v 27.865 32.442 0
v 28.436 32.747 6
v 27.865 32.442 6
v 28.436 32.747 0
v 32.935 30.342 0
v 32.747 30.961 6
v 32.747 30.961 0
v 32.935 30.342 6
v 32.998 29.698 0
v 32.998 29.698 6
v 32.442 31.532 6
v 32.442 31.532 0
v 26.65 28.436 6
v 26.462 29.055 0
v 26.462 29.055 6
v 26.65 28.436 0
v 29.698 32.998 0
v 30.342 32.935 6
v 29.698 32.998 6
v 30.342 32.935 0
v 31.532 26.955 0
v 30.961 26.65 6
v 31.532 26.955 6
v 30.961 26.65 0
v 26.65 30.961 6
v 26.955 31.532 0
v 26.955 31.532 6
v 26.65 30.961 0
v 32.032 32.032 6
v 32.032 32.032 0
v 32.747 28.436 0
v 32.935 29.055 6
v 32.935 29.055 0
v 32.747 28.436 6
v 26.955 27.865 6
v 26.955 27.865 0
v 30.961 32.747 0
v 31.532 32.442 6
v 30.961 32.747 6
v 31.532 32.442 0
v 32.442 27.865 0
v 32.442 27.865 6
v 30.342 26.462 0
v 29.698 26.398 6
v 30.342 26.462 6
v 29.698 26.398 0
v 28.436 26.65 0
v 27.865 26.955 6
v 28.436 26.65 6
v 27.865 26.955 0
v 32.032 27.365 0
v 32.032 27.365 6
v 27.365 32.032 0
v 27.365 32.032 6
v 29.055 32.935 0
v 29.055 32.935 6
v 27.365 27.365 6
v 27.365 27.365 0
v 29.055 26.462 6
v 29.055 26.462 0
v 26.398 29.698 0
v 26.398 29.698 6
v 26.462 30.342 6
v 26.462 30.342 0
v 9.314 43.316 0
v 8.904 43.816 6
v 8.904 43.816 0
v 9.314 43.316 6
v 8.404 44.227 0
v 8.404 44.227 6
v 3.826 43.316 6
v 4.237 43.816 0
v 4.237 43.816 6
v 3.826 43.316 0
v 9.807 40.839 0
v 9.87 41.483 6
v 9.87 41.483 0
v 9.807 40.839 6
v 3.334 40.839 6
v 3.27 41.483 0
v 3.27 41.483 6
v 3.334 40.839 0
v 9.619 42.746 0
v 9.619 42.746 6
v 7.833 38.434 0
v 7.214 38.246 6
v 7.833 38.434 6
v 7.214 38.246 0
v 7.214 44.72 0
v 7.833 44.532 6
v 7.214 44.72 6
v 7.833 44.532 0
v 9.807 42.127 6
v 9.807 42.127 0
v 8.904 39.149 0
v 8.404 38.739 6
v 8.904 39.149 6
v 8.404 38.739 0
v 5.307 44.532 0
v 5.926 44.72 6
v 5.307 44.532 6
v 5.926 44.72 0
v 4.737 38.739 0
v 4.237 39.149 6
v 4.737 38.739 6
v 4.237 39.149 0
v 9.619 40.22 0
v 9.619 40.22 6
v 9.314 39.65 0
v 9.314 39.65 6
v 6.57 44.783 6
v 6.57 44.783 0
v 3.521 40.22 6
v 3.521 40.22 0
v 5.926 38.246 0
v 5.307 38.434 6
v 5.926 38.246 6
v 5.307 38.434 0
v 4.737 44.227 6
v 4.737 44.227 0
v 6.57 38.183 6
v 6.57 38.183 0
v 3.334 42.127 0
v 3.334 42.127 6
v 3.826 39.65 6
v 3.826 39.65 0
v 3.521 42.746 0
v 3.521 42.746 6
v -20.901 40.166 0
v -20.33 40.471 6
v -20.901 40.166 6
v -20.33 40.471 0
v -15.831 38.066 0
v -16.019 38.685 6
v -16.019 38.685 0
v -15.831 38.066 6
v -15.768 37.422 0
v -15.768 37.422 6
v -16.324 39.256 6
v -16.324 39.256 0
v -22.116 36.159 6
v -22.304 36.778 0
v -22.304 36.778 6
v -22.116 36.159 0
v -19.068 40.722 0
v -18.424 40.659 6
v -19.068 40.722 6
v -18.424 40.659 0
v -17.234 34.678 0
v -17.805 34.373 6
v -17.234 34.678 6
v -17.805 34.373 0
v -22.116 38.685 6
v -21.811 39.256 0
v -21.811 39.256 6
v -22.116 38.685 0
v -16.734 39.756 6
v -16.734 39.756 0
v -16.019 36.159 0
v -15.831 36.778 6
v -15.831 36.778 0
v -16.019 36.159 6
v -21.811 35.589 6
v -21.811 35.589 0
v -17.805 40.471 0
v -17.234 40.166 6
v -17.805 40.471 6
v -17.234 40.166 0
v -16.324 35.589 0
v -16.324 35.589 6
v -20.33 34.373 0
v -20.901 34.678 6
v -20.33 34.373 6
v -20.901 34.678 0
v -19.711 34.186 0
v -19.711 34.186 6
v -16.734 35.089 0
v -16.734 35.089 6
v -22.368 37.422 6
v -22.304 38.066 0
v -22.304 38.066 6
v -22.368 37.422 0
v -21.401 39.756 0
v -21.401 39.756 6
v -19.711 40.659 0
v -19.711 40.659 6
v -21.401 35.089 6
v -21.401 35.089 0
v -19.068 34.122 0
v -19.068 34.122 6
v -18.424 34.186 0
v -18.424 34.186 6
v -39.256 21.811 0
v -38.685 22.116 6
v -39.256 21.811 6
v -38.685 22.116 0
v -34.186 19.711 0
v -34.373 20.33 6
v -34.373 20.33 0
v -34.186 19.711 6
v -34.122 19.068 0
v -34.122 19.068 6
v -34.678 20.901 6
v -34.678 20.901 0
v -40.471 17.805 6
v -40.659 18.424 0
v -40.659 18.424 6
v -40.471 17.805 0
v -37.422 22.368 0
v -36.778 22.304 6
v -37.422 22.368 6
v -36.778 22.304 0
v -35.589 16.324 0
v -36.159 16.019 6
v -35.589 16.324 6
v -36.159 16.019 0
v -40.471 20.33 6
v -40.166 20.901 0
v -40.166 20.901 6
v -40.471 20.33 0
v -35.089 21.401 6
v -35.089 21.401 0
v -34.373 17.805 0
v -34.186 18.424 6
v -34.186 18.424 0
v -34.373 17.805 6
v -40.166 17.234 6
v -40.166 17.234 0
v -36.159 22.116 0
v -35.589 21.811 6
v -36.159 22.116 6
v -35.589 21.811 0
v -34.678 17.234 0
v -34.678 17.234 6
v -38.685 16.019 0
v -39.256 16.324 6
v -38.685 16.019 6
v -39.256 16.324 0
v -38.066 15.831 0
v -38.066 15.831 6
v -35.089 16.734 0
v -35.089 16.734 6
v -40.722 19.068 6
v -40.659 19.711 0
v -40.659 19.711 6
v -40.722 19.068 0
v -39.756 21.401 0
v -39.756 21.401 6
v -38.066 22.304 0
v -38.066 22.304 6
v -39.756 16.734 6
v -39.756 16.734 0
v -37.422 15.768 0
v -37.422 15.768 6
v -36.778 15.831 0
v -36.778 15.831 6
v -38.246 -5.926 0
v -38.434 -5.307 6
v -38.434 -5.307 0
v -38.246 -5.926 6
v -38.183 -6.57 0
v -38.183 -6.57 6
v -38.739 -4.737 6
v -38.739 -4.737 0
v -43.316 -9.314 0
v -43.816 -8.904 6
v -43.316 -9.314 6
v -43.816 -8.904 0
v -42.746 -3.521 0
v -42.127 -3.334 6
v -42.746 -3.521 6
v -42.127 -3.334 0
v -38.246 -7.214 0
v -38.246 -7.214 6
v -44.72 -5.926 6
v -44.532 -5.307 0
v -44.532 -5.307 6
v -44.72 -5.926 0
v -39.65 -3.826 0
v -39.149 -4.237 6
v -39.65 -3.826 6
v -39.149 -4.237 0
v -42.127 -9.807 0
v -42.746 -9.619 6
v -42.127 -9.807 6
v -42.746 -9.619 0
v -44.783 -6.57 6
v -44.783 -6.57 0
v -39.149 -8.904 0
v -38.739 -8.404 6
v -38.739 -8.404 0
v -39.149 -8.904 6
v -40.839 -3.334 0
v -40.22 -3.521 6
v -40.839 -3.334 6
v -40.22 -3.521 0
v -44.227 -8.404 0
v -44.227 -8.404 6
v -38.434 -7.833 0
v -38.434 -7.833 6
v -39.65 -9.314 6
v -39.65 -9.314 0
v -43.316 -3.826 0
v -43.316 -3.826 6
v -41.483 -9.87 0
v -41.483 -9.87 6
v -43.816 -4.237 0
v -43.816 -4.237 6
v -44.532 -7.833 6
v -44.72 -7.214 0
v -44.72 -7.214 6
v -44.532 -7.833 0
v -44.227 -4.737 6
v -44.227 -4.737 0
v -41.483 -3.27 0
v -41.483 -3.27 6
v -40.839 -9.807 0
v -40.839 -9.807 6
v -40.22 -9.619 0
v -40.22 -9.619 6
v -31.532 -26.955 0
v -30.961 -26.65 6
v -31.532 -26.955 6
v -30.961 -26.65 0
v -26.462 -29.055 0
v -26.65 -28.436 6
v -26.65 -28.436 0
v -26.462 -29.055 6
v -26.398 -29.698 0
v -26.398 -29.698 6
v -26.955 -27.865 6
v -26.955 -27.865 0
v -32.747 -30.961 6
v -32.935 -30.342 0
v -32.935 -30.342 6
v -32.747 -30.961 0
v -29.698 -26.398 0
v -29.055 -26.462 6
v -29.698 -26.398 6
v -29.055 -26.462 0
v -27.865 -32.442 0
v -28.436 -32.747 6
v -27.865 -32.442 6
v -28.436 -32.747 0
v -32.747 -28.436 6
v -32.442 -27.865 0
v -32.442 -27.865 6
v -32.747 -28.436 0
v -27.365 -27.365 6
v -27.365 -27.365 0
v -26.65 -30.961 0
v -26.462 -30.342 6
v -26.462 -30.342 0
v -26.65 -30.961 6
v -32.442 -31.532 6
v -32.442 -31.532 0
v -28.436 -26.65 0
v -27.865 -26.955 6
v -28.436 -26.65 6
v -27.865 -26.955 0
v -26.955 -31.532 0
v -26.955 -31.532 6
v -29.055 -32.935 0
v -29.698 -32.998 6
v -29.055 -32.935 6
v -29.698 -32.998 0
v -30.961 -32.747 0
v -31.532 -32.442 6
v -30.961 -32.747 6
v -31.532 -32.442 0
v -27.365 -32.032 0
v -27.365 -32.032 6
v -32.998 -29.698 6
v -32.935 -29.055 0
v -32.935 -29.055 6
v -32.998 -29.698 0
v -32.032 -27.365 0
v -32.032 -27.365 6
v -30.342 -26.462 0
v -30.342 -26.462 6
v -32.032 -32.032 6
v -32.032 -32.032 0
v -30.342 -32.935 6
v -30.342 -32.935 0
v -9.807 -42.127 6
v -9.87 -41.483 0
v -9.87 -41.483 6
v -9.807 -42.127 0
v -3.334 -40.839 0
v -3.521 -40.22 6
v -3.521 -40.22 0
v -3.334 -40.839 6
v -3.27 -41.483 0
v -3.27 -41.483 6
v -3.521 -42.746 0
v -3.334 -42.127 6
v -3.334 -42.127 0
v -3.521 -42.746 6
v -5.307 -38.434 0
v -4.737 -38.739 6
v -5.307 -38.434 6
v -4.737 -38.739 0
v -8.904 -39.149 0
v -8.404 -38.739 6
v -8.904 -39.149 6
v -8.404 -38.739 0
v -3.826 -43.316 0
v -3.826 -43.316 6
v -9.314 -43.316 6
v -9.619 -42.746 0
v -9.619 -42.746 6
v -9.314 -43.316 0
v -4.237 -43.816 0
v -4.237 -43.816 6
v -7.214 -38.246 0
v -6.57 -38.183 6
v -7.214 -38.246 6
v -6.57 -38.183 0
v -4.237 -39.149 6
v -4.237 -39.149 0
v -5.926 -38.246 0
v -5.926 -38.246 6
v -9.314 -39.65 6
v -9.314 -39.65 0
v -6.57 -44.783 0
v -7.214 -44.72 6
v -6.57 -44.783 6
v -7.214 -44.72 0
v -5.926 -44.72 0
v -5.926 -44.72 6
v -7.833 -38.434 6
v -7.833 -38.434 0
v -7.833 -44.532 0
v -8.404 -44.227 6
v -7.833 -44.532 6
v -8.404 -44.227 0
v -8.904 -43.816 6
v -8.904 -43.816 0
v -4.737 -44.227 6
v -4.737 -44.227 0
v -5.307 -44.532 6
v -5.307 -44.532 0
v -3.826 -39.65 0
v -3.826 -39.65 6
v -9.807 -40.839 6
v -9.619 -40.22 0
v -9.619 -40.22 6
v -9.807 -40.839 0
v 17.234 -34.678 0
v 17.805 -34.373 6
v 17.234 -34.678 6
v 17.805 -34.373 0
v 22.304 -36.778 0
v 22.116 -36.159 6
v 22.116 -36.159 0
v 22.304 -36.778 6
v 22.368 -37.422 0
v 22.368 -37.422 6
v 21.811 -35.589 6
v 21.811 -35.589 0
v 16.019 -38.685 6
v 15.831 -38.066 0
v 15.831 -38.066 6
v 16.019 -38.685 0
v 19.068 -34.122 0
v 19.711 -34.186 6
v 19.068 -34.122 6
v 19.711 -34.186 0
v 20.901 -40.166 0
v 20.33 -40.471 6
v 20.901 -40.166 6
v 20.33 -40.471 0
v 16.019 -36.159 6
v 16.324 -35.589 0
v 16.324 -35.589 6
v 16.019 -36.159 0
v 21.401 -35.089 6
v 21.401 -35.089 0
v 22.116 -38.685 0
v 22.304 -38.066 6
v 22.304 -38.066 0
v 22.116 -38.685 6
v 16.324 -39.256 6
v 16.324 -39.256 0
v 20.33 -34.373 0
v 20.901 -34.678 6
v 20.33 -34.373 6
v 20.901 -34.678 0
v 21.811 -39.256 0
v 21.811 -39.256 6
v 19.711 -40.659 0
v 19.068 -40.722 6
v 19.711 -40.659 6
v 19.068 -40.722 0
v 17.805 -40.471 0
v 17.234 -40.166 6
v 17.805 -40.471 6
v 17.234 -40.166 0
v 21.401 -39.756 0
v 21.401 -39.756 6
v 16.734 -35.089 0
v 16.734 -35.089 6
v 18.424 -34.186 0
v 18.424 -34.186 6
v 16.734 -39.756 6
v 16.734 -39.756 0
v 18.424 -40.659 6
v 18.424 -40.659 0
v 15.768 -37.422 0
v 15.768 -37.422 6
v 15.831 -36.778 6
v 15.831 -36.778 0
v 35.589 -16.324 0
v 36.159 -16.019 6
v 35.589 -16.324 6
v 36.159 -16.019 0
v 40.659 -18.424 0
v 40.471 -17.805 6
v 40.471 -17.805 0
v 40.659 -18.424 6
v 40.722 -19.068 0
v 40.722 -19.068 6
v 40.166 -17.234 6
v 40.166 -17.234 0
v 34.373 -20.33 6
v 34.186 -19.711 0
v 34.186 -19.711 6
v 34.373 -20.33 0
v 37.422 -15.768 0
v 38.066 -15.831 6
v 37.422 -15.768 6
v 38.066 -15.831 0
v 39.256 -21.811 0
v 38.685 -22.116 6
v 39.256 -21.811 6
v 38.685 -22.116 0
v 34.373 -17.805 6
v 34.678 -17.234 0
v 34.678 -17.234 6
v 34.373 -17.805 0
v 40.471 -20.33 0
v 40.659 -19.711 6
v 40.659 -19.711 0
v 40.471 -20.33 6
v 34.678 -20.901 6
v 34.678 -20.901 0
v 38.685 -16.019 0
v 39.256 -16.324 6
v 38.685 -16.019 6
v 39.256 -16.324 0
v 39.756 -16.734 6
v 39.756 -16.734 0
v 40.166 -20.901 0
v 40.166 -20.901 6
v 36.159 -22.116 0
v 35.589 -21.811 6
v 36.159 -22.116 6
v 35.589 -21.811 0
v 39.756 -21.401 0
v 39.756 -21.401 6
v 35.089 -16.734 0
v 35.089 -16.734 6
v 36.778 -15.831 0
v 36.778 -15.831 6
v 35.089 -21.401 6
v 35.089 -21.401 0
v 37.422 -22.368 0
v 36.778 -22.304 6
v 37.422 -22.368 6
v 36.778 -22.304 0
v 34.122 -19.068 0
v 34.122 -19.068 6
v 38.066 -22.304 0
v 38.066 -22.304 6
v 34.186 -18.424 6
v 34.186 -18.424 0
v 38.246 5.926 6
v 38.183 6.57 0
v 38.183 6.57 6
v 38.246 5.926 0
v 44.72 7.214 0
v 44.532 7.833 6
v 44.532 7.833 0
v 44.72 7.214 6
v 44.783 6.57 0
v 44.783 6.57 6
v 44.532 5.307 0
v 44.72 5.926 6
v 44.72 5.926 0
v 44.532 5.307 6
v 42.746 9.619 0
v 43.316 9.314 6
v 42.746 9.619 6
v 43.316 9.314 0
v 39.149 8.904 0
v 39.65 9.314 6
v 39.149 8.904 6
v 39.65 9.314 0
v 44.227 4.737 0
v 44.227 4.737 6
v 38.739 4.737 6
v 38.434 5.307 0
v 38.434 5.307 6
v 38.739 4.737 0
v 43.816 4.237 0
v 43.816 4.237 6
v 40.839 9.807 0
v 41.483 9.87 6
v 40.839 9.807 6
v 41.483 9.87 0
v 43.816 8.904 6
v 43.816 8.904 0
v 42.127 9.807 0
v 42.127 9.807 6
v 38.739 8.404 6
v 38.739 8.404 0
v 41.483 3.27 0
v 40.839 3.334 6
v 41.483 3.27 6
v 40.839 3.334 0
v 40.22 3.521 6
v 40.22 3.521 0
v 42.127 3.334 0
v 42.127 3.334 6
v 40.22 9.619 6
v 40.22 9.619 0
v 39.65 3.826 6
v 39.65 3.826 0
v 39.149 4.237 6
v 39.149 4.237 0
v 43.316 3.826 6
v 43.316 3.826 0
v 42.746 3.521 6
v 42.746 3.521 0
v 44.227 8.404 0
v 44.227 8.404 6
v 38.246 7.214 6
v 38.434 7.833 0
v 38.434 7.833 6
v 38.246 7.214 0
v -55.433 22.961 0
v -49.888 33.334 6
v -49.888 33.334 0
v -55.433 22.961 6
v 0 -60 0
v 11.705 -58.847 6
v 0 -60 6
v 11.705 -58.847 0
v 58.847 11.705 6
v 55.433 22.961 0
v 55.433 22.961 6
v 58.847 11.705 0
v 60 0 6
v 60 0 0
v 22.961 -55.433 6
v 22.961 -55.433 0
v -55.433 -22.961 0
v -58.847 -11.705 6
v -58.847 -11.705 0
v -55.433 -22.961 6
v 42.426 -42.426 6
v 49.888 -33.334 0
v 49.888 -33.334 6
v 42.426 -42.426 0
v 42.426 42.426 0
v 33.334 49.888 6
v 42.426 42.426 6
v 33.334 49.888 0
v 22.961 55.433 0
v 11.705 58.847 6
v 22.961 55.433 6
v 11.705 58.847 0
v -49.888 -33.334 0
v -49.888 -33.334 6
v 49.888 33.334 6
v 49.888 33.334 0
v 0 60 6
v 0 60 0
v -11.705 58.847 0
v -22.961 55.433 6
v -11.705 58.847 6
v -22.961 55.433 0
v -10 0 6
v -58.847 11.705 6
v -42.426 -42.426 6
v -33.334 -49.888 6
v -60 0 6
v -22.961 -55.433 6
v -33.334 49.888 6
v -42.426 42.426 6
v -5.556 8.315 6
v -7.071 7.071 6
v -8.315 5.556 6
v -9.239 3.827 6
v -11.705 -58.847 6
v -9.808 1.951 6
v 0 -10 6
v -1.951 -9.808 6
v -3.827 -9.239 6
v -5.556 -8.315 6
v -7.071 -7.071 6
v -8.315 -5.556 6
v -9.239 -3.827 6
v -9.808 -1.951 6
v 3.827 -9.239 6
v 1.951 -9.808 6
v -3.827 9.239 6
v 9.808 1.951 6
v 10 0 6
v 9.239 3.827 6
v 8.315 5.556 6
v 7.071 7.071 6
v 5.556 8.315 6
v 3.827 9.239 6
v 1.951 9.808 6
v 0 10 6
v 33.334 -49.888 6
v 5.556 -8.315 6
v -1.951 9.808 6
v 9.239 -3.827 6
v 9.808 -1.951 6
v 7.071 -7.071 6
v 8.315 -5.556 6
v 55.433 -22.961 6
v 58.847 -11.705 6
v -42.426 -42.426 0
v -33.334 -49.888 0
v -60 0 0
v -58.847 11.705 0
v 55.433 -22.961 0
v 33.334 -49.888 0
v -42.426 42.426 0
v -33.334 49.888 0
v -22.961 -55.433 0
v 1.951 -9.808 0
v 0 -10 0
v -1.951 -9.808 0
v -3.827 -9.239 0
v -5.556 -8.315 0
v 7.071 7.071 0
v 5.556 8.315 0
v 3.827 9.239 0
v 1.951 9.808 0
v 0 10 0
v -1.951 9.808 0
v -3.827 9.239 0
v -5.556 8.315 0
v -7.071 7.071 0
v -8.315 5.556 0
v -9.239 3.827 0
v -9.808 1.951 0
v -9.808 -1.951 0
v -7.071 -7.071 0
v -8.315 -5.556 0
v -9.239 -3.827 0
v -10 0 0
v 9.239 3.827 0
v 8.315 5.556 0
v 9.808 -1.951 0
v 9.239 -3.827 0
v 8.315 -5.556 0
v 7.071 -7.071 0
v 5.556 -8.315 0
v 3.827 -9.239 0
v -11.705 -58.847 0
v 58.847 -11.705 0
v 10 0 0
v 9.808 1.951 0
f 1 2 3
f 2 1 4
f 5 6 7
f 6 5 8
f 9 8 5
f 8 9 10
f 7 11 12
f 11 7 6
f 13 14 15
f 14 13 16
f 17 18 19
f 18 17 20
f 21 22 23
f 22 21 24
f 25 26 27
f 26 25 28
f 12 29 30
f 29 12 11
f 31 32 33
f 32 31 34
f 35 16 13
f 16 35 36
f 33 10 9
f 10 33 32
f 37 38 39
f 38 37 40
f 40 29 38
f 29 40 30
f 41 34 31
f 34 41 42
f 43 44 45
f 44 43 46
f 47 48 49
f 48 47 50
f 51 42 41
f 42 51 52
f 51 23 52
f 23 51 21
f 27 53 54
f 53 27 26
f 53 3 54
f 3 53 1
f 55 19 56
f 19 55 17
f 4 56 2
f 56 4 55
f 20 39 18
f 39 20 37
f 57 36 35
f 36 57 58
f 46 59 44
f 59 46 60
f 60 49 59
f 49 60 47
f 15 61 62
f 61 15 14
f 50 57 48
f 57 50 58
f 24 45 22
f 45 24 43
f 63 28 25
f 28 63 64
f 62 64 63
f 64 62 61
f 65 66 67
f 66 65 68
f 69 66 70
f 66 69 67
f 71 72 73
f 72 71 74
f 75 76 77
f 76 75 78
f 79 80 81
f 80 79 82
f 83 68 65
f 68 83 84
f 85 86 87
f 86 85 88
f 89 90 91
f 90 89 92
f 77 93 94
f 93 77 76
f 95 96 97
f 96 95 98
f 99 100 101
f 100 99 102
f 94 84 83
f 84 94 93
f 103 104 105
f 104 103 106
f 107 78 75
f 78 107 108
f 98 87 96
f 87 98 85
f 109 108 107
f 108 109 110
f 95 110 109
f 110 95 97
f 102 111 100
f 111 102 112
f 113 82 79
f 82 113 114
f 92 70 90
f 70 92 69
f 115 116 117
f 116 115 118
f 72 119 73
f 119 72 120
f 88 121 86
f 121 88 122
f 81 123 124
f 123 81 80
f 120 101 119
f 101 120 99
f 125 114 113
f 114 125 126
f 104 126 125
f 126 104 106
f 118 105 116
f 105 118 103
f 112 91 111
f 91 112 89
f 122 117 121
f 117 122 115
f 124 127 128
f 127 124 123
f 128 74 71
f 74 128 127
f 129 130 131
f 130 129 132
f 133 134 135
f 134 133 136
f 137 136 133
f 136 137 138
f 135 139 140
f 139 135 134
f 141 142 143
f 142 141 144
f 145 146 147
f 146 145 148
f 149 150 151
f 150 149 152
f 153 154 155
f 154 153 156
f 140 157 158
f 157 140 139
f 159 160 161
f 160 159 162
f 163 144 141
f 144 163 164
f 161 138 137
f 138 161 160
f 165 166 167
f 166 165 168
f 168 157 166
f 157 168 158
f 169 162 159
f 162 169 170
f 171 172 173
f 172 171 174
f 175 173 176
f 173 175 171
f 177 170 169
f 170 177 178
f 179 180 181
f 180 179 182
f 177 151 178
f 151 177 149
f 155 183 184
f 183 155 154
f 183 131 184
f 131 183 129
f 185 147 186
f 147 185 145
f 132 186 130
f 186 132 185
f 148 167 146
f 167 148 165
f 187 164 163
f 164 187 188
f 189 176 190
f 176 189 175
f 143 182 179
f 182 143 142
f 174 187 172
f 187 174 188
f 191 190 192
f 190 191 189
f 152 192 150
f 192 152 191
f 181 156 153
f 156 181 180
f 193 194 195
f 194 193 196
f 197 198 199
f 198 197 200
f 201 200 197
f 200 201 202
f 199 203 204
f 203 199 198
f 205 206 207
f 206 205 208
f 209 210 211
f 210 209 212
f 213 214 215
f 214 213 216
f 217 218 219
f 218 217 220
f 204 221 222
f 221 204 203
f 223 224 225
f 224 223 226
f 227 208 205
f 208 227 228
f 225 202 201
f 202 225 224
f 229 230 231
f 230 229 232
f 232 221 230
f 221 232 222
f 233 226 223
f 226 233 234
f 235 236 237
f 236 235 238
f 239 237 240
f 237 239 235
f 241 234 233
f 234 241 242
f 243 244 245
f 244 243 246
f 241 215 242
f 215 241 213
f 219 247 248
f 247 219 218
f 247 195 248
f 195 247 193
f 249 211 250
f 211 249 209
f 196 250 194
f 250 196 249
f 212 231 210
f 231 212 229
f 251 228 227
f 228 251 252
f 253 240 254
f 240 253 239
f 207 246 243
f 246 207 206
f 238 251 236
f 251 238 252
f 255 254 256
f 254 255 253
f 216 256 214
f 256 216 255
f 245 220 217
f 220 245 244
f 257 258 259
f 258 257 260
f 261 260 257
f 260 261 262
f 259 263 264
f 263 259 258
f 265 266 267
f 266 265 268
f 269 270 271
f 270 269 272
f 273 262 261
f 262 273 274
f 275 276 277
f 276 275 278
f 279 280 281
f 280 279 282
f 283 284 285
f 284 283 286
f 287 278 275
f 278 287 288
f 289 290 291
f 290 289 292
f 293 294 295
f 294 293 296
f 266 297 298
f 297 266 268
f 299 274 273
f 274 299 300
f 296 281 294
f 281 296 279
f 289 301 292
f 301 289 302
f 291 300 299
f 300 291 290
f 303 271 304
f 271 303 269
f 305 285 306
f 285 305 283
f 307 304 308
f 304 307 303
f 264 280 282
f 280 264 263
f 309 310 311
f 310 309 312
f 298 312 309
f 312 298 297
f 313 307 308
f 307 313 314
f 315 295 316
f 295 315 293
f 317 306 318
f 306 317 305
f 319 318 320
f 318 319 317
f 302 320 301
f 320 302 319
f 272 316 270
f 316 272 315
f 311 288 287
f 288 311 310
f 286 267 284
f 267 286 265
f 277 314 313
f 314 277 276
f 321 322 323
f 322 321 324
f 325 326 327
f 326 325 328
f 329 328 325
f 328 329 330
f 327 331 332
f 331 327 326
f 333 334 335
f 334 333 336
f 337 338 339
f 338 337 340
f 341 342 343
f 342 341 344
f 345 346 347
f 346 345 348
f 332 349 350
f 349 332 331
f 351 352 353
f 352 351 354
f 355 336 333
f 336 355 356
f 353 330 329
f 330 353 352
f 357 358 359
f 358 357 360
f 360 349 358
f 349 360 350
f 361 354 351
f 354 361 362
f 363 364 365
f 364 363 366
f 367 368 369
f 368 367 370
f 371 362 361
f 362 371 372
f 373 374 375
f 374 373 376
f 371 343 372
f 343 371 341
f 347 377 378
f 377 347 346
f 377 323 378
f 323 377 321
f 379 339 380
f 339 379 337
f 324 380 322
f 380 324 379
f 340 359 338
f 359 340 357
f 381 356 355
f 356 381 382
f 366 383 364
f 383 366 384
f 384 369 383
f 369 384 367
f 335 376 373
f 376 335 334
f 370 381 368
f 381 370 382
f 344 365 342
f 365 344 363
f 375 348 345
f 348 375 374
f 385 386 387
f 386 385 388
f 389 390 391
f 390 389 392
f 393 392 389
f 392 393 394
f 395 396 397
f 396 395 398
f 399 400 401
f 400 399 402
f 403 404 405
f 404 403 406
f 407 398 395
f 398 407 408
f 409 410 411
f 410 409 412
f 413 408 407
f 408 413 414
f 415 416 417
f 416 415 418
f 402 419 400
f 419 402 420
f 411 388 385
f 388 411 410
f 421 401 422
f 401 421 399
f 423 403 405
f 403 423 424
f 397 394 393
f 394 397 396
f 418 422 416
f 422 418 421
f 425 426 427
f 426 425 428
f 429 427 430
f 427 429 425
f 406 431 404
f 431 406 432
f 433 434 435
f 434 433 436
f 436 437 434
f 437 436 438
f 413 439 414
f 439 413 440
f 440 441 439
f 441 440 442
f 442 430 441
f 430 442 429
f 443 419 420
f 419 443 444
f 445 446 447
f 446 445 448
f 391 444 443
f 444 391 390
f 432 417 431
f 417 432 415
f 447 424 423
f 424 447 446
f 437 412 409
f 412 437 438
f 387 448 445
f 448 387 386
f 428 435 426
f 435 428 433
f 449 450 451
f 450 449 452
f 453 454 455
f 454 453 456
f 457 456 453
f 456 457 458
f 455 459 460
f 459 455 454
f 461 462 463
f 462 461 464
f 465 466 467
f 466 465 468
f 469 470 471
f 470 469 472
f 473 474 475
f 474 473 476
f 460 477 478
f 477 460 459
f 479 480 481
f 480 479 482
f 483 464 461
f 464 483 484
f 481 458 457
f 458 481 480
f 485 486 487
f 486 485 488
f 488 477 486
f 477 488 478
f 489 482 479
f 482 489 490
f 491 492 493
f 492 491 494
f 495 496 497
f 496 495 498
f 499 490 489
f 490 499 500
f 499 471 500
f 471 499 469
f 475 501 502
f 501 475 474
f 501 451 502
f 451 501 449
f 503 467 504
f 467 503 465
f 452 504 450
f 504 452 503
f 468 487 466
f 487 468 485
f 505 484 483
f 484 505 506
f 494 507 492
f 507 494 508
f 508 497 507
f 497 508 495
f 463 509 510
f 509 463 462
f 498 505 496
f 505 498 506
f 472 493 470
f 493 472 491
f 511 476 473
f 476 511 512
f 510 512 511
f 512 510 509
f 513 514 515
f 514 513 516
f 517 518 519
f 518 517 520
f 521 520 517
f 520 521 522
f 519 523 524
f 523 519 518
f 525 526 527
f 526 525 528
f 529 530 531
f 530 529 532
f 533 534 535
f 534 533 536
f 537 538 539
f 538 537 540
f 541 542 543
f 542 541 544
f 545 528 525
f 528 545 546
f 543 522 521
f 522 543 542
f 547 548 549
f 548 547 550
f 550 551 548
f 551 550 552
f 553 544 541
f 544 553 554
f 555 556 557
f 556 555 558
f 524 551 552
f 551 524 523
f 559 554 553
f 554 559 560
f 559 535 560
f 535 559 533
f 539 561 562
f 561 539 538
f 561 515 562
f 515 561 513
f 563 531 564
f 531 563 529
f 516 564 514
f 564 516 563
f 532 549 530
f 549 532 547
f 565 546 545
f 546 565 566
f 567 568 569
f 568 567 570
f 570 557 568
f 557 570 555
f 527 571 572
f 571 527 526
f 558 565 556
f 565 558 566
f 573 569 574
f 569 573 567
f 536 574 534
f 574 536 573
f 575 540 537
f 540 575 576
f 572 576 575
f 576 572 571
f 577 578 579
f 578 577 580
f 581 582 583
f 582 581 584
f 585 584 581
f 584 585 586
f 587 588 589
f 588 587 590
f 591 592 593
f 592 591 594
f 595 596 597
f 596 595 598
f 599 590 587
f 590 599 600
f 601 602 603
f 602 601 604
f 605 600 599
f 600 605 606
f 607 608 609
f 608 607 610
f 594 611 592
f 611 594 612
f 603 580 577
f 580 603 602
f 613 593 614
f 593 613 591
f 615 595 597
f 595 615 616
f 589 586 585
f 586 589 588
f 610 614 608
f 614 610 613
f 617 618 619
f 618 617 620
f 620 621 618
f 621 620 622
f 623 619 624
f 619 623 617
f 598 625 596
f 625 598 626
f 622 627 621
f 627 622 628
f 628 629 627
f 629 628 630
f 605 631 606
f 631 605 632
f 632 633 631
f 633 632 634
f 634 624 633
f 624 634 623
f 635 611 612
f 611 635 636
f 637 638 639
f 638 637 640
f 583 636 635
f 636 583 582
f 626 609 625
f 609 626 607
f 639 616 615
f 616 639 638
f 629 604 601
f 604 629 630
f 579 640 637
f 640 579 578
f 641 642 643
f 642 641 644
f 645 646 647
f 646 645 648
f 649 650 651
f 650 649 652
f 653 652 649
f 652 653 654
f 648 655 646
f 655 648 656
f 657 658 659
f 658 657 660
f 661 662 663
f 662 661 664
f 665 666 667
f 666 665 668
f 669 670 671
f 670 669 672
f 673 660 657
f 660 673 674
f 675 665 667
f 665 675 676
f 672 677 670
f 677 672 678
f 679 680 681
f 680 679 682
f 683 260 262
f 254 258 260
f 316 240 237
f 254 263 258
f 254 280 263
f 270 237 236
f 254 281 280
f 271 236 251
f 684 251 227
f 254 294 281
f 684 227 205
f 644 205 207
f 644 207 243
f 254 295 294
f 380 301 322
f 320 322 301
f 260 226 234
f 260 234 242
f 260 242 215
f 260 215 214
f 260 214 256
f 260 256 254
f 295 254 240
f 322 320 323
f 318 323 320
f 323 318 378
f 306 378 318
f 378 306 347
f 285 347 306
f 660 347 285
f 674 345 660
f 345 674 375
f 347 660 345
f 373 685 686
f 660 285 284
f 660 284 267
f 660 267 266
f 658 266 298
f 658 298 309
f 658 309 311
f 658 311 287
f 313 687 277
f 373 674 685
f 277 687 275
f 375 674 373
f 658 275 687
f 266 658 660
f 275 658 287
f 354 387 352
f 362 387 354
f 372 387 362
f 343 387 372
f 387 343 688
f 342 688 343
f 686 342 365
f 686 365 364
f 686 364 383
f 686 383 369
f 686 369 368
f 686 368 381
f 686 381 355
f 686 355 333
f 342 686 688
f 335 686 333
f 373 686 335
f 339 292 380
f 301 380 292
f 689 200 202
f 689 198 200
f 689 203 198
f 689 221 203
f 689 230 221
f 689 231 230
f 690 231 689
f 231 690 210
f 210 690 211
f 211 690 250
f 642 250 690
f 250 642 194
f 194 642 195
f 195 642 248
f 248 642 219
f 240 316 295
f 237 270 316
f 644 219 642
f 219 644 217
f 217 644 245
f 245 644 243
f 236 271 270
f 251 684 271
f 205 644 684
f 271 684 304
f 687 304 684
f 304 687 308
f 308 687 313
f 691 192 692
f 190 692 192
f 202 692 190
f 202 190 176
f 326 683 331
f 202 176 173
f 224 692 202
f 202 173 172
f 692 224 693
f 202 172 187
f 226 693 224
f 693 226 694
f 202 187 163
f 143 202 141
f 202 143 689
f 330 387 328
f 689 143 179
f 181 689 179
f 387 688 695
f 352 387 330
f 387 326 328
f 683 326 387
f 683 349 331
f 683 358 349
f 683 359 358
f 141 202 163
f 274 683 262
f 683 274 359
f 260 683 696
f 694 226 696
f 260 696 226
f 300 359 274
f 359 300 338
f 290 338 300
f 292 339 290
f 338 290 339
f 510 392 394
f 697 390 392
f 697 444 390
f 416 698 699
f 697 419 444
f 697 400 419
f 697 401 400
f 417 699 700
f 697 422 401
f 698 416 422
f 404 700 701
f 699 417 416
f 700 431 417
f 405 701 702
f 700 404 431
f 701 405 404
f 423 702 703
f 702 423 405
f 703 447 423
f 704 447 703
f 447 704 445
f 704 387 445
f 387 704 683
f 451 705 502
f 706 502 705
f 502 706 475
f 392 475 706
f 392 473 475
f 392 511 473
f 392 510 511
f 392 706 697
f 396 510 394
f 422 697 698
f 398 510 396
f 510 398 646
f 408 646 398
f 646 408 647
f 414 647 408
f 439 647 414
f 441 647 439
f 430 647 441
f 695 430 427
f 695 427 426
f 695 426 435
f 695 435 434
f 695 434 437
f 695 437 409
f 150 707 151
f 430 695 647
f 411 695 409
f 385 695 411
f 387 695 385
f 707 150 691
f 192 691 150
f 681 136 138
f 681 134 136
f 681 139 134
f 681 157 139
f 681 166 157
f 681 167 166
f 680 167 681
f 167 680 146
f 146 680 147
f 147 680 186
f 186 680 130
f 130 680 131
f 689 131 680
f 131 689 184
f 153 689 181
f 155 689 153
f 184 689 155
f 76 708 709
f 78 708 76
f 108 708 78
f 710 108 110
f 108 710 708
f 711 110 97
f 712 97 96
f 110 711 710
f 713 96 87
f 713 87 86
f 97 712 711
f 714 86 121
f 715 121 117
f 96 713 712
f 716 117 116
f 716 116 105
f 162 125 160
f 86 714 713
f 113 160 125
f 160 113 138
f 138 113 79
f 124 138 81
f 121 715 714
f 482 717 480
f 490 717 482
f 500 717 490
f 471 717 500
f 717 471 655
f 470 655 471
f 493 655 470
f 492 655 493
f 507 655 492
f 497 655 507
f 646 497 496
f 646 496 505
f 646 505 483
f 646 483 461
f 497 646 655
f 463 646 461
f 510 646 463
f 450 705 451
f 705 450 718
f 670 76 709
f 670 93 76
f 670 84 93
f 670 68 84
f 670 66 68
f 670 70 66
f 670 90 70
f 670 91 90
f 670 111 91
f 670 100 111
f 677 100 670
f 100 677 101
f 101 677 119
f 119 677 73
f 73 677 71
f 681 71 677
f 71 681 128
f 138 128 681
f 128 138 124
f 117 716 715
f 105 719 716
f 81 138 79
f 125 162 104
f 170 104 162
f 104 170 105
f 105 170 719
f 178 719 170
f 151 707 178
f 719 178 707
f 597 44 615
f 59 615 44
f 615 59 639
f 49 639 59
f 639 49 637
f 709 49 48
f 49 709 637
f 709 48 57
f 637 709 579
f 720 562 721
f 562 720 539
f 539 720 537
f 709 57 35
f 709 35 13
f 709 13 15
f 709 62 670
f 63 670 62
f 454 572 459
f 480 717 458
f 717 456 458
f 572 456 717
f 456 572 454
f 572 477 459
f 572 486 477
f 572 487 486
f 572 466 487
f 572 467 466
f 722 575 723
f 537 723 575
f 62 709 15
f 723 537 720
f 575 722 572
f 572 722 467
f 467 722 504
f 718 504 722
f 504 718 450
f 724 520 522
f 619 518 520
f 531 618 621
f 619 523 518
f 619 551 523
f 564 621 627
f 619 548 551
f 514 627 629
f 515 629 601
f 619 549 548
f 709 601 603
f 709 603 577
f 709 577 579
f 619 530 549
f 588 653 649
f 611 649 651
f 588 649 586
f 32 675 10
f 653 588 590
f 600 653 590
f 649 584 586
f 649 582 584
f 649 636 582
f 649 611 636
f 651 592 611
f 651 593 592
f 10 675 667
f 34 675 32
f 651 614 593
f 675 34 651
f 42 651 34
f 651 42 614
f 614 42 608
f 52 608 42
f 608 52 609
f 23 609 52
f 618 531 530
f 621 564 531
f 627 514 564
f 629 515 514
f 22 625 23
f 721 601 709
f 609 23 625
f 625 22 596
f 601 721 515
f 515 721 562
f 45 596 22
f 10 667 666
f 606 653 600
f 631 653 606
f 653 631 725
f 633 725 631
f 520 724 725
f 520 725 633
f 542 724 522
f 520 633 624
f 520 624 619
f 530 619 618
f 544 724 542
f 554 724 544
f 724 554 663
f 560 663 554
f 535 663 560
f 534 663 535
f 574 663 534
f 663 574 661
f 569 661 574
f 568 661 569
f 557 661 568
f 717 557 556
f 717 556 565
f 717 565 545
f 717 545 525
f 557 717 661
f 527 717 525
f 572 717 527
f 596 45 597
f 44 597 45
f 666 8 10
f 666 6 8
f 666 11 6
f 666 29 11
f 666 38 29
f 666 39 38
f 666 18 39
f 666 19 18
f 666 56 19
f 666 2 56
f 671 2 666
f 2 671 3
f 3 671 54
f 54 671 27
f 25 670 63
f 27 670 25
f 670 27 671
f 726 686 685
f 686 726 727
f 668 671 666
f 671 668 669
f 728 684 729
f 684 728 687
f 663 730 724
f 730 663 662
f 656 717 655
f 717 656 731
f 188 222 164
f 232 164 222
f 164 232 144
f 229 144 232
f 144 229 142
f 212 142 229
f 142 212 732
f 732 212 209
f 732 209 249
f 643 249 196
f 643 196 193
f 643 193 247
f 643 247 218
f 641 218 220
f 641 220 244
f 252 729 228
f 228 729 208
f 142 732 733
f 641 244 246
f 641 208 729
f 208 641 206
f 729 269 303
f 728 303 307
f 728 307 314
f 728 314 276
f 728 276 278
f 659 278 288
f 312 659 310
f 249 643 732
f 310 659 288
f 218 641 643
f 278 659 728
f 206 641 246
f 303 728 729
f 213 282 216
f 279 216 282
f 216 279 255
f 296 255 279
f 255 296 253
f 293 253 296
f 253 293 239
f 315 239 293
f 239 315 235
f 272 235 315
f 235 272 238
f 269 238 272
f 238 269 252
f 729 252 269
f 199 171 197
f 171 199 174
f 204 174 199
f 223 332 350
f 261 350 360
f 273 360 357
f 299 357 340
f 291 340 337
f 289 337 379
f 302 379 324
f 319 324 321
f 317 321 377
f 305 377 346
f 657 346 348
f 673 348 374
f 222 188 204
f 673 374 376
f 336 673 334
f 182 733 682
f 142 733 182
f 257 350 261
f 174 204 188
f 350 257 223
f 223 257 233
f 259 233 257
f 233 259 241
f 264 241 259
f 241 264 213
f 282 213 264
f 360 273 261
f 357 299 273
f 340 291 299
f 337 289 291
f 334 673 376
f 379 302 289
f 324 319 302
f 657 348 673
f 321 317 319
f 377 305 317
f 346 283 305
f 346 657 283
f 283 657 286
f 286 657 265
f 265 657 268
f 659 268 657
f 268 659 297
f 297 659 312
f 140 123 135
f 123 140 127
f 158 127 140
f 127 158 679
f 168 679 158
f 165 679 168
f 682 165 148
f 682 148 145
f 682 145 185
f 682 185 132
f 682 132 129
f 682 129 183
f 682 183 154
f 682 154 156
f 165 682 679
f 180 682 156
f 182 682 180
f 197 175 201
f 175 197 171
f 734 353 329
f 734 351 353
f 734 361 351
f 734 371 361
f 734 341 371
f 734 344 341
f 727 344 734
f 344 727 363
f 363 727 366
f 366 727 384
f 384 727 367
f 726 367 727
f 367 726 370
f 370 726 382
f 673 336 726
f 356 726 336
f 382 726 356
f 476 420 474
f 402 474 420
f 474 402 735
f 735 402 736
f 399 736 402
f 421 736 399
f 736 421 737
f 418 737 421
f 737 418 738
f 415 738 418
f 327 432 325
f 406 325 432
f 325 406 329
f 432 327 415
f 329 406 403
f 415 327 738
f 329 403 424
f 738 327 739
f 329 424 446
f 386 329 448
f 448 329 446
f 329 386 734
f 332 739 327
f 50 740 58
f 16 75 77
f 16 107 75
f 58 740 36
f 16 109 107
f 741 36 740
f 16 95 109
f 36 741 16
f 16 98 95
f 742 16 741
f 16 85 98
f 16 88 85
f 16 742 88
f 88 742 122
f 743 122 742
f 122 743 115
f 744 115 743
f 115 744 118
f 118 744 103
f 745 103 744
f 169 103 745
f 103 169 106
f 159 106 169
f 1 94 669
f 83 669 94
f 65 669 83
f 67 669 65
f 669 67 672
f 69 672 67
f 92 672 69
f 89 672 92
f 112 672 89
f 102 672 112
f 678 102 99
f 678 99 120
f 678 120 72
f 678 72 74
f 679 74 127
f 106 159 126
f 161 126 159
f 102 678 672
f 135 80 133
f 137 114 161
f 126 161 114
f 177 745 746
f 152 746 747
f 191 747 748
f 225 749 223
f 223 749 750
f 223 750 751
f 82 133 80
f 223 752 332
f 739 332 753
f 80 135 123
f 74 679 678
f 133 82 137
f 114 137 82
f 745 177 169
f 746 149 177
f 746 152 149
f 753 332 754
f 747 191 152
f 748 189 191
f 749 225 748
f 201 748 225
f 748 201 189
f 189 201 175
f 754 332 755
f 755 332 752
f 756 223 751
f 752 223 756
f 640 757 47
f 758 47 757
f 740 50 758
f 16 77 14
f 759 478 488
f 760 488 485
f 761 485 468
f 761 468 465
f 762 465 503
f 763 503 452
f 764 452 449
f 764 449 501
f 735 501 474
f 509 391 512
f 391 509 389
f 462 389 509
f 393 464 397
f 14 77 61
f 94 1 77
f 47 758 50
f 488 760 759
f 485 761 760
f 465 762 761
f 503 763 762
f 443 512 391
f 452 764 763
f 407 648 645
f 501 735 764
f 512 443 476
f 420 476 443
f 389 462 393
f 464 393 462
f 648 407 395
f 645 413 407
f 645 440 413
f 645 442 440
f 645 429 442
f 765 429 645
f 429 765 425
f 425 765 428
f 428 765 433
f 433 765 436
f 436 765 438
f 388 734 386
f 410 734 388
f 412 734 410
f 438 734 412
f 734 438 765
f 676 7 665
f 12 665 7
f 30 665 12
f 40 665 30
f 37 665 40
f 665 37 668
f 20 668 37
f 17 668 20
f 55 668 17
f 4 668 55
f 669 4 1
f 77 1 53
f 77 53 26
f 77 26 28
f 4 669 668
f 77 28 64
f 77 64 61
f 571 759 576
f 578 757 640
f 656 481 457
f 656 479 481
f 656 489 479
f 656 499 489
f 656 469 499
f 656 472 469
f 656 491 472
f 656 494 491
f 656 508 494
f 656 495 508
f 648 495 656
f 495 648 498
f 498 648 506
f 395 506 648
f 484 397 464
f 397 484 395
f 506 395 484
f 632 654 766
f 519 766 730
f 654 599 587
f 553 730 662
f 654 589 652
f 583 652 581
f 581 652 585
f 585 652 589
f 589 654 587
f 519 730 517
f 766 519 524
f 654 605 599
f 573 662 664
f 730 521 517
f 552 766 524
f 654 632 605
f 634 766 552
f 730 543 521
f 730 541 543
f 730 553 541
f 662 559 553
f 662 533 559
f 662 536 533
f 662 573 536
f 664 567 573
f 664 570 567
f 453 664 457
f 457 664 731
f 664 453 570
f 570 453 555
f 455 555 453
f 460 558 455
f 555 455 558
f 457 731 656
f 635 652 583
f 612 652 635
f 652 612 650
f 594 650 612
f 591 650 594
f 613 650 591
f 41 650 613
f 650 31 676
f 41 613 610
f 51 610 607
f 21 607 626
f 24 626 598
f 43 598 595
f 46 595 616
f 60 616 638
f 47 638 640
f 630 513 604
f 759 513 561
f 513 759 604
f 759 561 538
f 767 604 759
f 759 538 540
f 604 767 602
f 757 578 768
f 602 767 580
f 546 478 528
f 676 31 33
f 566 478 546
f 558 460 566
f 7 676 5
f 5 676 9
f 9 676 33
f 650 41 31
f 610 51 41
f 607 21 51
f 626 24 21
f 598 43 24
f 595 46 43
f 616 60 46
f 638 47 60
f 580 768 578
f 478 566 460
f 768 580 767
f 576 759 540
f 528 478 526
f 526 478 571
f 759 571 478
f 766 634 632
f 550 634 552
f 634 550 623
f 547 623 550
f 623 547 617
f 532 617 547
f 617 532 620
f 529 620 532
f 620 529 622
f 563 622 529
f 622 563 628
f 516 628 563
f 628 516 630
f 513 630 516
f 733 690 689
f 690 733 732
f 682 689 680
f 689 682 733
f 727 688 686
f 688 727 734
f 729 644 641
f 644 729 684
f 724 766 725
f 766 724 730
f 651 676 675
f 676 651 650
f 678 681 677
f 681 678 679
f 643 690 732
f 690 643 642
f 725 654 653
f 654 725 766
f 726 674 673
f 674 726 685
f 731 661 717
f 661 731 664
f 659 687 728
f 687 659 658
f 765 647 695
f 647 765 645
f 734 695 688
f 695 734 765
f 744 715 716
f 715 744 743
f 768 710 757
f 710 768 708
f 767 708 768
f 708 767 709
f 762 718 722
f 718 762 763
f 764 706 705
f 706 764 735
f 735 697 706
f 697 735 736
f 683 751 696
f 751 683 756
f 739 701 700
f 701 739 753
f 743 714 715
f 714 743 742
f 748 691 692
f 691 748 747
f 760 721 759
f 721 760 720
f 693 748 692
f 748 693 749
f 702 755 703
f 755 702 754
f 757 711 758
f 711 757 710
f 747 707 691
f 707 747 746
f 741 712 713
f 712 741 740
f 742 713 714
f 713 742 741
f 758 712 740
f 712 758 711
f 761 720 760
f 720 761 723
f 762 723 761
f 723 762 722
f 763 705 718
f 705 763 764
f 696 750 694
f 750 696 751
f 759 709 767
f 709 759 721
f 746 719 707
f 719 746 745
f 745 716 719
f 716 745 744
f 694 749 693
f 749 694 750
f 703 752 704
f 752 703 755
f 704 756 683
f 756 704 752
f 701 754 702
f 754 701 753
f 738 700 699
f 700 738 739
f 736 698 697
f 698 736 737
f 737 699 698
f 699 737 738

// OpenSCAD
$fn = 32;

// ----------------------------------------------------------------------
// Flange Ø120 x 6
// 10 holes on a Ø84 bolt circle, bolted joints
// ----------------------------------------------------------------------

// --- parameters (mm) ---
flange_d = 120;  // outside diameter of the flange
thickness = 6;   // flange thickness
holes = 10;      // number of bolt holes
pcd = 84;        // bolt circle diameter
start_deg = 45;  // angle of the first hole, from +X
hole_d = 6.6;    // bolt hole diameter
bore_d = 20;     // central through bore
hub_d = 30;      // hub outside diameter
hub_h = 0;       // hub height above the flange face (0 = no hub)

// --- derived feature positions (mm) ---
height = thickness + hub_h;  // = 6   overall height of the part
pcd_r = pcd / 2;             // = 42   bolt circle radius
hole_step = 360 / holes;     // = 36   angular pitch
feature_centers = [
  [pcd_r * cos(start_deg + 0 * hole_step), pcd_r * sin(start_deg + 0 * hole_step)],
  [pcd_r * cos(start_deg + 1 * hole_step), pcd_r * sin(start_deg + 1 * hole_step)],
  [pcd_r * cos(start_deg + 2 * hole_step), pcd_r * sin(start_deg + 2 * hole_step)],
  [pcd_r * cos(start_deg + 3 * hole_step), pcd_r * sin(start_deg + 3 * hole_step)],
  [pcd_r * cos(start_deg + 4 * hole_step), pcd_r * sin(start_deg + 4 * hole_step)],
  [pcd_r * cos(start_deg + 5 * hole_step), pcd_r * sin(start_deg + 5 * hole_step)],
  [pcd_r * cos(start_deg + 6 * hole_step), pcd_r * sin(start_deg + 6 * hole_step)],
  [pcd_r * cos(start_deg + 7 * hole_step), pcd_r * sin(start_deg + 7 * hole_step)],
  [pcd_r * cos(start_deg + 8 * hole_step), pcd_r * sin(start_deg + 8 * hole_step)],
  [pcd_r * cos(start_deg + 9 * hole_step), pcd_r * sin(start_deg + 9 * hole_step)]
];   // bolt hole centres on the pitch circle

// flange disc, every hole and the bore cut straight through
difference() {
  union() {
    cylinder(d = flange_d, h = thickness);
  }
  translate([0, 0, -1]) cylinder(d = bore_d, h = height + 2);  // bore, through
  for (centre = feature_centers)
    translate([centre[0], centre[1], -1]) cylinder(d = hole_d, h = thickness + 2);
}
